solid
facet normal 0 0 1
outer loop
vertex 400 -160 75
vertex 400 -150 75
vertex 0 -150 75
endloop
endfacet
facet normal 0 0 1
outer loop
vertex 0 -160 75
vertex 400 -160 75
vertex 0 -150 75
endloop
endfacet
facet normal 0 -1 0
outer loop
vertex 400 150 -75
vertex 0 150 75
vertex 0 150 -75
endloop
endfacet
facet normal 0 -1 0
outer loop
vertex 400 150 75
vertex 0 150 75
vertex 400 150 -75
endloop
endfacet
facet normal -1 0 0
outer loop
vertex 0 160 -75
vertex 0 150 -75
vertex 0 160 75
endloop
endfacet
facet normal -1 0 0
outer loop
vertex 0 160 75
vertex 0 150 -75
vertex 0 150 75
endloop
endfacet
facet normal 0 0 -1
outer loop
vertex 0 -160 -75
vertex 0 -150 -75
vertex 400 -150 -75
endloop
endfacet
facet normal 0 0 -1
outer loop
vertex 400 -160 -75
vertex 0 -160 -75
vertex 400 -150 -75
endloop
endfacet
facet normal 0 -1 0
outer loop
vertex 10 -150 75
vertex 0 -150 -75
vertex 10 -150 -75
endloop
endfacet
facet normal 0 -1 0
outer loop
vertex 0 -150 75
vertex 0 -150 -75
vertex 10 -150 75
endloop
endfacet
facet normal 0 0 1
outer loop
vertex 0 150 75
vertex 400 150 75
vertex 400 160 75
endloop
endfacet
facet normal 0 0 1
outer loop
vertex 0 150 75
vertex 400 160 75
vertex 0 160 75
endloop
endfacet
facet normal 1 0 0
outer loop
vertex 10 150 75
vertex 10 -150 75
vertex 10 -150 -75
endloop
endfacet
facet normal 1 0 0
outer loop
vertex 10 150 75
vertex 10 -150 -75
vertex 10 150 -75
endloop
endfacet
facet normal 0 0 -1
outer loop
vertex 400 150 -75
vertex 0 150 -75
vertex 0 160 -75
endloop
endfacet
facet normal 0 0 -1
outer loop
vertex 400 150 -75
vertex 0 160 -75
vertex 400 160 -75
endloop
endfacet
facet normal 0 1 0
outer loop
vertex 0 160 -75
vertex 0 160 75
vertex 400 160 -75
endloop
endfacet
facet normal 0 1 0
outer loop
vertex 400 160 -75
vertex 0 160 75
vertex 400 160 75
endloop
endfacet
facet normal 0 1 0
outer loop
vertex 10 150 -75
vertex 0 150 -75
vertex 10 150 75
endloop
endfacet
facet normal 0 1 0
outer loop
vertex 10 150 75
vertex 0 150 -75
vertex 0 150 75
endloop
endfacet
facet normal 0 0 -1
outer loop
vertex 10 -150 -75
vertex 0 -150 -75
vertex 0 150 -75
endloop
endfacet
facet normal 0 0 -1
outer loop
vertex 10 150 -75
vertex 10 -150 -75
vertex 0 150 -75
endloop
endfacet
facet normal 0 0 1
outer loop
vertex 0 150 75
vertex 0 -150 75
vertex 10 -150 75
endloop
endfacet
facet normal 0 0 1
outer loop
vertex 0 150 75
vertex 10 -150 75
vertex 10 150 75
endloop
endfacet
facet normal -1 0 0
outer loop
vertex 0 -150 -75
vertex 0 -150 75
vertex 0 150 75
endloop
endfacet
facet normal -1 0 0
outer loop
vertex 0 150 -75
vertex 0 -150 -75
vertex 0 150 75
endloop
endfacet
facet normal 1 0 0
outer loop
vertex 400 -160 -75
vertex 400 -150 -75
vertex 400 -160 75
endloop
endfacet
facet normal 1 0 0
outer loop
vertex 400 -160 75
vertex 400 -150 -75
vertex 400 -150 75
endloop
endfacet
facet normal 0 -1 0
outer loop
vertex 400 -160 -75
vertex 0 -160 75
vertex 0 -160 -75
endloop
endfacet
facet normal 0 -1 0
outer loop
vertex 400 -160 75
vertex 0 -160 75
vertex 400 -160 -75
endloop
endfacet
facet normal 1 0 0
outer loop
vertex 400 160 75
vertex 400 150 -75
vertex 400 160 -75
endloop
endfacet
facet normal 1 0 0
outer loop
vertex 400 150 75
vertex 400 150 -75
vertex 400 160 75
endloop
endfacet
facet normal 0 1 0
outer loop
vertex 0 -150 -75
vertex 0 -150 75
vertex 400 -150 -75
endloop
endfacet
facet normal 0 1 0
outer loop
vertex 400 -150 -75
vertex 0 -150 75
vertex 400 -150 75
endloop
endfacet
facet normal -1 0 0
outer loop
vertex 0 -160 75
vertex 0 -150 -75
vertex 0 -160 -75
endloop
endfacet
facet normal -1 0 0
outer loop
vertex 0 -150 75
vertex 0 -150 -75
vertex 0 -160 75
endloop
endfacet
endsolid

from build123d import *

# Parameters (mm, degrees)
F0_W     = 300
F0_H     = 150
F1_DEPTH = 10
F2_W     = 390
F2_H     = 150
F2_W_2   = 10
F3_DEPTH = 10


with BuildPart() as f1:
    # F0 (on Right) → F1 (new body)
    with BuildSketch(Plane.YZ):
        Rectangle(F0_W, F0_H)
    extrude(amount=F1_DEPTH)


with BuildPart() as f3:
    # F2 (on face) → F3 (new body)
    with BuildSketch(Plane.XZ.offset(150)):
        with Locations((205, 0)):
            Rectangle(F2_W, F2_H)
        with Locations((5, 0)):
            Rectangle(F2_W_2, F2_H)
    extrude(amount=F3_DEPTH)


with BuildPart() as f4_1:
    # F4: instance of F3
    add(f3.part.mirror(Plane.XZ))


solid = Compound([f1.part, f3.part, f4_1.part])
